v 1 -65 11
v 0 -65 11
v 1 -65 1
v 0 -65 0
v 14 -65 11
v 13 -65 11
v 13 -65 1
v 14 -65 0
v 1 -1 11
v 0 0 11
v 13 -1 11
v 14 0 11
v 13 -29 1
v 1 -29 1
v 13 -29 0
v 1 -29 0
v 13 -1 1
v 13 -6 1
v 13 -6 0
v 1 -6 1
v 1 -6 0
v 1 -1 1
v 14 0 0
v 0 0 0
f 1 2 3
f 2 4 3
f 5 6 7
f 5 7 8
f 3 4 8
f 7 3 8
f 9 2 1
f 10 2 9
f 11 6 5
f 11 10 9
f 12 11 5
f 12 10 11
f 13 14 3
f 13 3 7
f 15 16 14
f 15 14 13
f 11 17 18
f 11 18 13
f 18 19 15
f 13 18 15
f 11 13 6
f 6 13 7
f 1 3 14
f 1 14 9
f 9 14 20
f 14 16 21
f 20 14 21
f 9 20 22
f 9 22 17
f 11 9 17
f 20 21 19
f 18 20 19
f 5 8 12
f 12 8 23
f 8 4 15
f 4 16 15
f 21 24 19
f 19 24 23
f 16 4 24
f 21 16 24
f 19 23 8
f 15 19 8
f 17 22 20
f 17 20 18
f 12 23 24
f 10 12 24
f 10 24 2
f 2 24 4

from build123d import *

# Parameters (mm, degrees)
F1_W     = 14
F1_H     = 65
F1_W_2   = 12
F1_H_2   = 23
F2_DEPTH = 1
F4_DEPTH = 10


with BuildPart() as f2:
    # F1 (on Top) → F2 (new body)
    with BuildSketch(Plane.XY):
        with Locations((7, -32.5)):
            Rectangle(F1_W, F1_H)
        with Locations((7, -17.5)):
            Rectangle(F1_W_2, F1_H_2, mode=Mode.SUBTRACT)
    extrude(amount=F2_DEPTH)

    # F3 (on face) → F4 (join)
    with BuildSketch(Plane.XY.offset(1)):
        Polygon((0, 0), (0, -65), (1, -65), (1, -29), (1, -6), (1, -1), (13, -1), (13, -6), (13, -29), (13, -65), (14, -65), (14, 0), align=None)
    extrude(amount=F4_DEPTH)


solid = f2.part
